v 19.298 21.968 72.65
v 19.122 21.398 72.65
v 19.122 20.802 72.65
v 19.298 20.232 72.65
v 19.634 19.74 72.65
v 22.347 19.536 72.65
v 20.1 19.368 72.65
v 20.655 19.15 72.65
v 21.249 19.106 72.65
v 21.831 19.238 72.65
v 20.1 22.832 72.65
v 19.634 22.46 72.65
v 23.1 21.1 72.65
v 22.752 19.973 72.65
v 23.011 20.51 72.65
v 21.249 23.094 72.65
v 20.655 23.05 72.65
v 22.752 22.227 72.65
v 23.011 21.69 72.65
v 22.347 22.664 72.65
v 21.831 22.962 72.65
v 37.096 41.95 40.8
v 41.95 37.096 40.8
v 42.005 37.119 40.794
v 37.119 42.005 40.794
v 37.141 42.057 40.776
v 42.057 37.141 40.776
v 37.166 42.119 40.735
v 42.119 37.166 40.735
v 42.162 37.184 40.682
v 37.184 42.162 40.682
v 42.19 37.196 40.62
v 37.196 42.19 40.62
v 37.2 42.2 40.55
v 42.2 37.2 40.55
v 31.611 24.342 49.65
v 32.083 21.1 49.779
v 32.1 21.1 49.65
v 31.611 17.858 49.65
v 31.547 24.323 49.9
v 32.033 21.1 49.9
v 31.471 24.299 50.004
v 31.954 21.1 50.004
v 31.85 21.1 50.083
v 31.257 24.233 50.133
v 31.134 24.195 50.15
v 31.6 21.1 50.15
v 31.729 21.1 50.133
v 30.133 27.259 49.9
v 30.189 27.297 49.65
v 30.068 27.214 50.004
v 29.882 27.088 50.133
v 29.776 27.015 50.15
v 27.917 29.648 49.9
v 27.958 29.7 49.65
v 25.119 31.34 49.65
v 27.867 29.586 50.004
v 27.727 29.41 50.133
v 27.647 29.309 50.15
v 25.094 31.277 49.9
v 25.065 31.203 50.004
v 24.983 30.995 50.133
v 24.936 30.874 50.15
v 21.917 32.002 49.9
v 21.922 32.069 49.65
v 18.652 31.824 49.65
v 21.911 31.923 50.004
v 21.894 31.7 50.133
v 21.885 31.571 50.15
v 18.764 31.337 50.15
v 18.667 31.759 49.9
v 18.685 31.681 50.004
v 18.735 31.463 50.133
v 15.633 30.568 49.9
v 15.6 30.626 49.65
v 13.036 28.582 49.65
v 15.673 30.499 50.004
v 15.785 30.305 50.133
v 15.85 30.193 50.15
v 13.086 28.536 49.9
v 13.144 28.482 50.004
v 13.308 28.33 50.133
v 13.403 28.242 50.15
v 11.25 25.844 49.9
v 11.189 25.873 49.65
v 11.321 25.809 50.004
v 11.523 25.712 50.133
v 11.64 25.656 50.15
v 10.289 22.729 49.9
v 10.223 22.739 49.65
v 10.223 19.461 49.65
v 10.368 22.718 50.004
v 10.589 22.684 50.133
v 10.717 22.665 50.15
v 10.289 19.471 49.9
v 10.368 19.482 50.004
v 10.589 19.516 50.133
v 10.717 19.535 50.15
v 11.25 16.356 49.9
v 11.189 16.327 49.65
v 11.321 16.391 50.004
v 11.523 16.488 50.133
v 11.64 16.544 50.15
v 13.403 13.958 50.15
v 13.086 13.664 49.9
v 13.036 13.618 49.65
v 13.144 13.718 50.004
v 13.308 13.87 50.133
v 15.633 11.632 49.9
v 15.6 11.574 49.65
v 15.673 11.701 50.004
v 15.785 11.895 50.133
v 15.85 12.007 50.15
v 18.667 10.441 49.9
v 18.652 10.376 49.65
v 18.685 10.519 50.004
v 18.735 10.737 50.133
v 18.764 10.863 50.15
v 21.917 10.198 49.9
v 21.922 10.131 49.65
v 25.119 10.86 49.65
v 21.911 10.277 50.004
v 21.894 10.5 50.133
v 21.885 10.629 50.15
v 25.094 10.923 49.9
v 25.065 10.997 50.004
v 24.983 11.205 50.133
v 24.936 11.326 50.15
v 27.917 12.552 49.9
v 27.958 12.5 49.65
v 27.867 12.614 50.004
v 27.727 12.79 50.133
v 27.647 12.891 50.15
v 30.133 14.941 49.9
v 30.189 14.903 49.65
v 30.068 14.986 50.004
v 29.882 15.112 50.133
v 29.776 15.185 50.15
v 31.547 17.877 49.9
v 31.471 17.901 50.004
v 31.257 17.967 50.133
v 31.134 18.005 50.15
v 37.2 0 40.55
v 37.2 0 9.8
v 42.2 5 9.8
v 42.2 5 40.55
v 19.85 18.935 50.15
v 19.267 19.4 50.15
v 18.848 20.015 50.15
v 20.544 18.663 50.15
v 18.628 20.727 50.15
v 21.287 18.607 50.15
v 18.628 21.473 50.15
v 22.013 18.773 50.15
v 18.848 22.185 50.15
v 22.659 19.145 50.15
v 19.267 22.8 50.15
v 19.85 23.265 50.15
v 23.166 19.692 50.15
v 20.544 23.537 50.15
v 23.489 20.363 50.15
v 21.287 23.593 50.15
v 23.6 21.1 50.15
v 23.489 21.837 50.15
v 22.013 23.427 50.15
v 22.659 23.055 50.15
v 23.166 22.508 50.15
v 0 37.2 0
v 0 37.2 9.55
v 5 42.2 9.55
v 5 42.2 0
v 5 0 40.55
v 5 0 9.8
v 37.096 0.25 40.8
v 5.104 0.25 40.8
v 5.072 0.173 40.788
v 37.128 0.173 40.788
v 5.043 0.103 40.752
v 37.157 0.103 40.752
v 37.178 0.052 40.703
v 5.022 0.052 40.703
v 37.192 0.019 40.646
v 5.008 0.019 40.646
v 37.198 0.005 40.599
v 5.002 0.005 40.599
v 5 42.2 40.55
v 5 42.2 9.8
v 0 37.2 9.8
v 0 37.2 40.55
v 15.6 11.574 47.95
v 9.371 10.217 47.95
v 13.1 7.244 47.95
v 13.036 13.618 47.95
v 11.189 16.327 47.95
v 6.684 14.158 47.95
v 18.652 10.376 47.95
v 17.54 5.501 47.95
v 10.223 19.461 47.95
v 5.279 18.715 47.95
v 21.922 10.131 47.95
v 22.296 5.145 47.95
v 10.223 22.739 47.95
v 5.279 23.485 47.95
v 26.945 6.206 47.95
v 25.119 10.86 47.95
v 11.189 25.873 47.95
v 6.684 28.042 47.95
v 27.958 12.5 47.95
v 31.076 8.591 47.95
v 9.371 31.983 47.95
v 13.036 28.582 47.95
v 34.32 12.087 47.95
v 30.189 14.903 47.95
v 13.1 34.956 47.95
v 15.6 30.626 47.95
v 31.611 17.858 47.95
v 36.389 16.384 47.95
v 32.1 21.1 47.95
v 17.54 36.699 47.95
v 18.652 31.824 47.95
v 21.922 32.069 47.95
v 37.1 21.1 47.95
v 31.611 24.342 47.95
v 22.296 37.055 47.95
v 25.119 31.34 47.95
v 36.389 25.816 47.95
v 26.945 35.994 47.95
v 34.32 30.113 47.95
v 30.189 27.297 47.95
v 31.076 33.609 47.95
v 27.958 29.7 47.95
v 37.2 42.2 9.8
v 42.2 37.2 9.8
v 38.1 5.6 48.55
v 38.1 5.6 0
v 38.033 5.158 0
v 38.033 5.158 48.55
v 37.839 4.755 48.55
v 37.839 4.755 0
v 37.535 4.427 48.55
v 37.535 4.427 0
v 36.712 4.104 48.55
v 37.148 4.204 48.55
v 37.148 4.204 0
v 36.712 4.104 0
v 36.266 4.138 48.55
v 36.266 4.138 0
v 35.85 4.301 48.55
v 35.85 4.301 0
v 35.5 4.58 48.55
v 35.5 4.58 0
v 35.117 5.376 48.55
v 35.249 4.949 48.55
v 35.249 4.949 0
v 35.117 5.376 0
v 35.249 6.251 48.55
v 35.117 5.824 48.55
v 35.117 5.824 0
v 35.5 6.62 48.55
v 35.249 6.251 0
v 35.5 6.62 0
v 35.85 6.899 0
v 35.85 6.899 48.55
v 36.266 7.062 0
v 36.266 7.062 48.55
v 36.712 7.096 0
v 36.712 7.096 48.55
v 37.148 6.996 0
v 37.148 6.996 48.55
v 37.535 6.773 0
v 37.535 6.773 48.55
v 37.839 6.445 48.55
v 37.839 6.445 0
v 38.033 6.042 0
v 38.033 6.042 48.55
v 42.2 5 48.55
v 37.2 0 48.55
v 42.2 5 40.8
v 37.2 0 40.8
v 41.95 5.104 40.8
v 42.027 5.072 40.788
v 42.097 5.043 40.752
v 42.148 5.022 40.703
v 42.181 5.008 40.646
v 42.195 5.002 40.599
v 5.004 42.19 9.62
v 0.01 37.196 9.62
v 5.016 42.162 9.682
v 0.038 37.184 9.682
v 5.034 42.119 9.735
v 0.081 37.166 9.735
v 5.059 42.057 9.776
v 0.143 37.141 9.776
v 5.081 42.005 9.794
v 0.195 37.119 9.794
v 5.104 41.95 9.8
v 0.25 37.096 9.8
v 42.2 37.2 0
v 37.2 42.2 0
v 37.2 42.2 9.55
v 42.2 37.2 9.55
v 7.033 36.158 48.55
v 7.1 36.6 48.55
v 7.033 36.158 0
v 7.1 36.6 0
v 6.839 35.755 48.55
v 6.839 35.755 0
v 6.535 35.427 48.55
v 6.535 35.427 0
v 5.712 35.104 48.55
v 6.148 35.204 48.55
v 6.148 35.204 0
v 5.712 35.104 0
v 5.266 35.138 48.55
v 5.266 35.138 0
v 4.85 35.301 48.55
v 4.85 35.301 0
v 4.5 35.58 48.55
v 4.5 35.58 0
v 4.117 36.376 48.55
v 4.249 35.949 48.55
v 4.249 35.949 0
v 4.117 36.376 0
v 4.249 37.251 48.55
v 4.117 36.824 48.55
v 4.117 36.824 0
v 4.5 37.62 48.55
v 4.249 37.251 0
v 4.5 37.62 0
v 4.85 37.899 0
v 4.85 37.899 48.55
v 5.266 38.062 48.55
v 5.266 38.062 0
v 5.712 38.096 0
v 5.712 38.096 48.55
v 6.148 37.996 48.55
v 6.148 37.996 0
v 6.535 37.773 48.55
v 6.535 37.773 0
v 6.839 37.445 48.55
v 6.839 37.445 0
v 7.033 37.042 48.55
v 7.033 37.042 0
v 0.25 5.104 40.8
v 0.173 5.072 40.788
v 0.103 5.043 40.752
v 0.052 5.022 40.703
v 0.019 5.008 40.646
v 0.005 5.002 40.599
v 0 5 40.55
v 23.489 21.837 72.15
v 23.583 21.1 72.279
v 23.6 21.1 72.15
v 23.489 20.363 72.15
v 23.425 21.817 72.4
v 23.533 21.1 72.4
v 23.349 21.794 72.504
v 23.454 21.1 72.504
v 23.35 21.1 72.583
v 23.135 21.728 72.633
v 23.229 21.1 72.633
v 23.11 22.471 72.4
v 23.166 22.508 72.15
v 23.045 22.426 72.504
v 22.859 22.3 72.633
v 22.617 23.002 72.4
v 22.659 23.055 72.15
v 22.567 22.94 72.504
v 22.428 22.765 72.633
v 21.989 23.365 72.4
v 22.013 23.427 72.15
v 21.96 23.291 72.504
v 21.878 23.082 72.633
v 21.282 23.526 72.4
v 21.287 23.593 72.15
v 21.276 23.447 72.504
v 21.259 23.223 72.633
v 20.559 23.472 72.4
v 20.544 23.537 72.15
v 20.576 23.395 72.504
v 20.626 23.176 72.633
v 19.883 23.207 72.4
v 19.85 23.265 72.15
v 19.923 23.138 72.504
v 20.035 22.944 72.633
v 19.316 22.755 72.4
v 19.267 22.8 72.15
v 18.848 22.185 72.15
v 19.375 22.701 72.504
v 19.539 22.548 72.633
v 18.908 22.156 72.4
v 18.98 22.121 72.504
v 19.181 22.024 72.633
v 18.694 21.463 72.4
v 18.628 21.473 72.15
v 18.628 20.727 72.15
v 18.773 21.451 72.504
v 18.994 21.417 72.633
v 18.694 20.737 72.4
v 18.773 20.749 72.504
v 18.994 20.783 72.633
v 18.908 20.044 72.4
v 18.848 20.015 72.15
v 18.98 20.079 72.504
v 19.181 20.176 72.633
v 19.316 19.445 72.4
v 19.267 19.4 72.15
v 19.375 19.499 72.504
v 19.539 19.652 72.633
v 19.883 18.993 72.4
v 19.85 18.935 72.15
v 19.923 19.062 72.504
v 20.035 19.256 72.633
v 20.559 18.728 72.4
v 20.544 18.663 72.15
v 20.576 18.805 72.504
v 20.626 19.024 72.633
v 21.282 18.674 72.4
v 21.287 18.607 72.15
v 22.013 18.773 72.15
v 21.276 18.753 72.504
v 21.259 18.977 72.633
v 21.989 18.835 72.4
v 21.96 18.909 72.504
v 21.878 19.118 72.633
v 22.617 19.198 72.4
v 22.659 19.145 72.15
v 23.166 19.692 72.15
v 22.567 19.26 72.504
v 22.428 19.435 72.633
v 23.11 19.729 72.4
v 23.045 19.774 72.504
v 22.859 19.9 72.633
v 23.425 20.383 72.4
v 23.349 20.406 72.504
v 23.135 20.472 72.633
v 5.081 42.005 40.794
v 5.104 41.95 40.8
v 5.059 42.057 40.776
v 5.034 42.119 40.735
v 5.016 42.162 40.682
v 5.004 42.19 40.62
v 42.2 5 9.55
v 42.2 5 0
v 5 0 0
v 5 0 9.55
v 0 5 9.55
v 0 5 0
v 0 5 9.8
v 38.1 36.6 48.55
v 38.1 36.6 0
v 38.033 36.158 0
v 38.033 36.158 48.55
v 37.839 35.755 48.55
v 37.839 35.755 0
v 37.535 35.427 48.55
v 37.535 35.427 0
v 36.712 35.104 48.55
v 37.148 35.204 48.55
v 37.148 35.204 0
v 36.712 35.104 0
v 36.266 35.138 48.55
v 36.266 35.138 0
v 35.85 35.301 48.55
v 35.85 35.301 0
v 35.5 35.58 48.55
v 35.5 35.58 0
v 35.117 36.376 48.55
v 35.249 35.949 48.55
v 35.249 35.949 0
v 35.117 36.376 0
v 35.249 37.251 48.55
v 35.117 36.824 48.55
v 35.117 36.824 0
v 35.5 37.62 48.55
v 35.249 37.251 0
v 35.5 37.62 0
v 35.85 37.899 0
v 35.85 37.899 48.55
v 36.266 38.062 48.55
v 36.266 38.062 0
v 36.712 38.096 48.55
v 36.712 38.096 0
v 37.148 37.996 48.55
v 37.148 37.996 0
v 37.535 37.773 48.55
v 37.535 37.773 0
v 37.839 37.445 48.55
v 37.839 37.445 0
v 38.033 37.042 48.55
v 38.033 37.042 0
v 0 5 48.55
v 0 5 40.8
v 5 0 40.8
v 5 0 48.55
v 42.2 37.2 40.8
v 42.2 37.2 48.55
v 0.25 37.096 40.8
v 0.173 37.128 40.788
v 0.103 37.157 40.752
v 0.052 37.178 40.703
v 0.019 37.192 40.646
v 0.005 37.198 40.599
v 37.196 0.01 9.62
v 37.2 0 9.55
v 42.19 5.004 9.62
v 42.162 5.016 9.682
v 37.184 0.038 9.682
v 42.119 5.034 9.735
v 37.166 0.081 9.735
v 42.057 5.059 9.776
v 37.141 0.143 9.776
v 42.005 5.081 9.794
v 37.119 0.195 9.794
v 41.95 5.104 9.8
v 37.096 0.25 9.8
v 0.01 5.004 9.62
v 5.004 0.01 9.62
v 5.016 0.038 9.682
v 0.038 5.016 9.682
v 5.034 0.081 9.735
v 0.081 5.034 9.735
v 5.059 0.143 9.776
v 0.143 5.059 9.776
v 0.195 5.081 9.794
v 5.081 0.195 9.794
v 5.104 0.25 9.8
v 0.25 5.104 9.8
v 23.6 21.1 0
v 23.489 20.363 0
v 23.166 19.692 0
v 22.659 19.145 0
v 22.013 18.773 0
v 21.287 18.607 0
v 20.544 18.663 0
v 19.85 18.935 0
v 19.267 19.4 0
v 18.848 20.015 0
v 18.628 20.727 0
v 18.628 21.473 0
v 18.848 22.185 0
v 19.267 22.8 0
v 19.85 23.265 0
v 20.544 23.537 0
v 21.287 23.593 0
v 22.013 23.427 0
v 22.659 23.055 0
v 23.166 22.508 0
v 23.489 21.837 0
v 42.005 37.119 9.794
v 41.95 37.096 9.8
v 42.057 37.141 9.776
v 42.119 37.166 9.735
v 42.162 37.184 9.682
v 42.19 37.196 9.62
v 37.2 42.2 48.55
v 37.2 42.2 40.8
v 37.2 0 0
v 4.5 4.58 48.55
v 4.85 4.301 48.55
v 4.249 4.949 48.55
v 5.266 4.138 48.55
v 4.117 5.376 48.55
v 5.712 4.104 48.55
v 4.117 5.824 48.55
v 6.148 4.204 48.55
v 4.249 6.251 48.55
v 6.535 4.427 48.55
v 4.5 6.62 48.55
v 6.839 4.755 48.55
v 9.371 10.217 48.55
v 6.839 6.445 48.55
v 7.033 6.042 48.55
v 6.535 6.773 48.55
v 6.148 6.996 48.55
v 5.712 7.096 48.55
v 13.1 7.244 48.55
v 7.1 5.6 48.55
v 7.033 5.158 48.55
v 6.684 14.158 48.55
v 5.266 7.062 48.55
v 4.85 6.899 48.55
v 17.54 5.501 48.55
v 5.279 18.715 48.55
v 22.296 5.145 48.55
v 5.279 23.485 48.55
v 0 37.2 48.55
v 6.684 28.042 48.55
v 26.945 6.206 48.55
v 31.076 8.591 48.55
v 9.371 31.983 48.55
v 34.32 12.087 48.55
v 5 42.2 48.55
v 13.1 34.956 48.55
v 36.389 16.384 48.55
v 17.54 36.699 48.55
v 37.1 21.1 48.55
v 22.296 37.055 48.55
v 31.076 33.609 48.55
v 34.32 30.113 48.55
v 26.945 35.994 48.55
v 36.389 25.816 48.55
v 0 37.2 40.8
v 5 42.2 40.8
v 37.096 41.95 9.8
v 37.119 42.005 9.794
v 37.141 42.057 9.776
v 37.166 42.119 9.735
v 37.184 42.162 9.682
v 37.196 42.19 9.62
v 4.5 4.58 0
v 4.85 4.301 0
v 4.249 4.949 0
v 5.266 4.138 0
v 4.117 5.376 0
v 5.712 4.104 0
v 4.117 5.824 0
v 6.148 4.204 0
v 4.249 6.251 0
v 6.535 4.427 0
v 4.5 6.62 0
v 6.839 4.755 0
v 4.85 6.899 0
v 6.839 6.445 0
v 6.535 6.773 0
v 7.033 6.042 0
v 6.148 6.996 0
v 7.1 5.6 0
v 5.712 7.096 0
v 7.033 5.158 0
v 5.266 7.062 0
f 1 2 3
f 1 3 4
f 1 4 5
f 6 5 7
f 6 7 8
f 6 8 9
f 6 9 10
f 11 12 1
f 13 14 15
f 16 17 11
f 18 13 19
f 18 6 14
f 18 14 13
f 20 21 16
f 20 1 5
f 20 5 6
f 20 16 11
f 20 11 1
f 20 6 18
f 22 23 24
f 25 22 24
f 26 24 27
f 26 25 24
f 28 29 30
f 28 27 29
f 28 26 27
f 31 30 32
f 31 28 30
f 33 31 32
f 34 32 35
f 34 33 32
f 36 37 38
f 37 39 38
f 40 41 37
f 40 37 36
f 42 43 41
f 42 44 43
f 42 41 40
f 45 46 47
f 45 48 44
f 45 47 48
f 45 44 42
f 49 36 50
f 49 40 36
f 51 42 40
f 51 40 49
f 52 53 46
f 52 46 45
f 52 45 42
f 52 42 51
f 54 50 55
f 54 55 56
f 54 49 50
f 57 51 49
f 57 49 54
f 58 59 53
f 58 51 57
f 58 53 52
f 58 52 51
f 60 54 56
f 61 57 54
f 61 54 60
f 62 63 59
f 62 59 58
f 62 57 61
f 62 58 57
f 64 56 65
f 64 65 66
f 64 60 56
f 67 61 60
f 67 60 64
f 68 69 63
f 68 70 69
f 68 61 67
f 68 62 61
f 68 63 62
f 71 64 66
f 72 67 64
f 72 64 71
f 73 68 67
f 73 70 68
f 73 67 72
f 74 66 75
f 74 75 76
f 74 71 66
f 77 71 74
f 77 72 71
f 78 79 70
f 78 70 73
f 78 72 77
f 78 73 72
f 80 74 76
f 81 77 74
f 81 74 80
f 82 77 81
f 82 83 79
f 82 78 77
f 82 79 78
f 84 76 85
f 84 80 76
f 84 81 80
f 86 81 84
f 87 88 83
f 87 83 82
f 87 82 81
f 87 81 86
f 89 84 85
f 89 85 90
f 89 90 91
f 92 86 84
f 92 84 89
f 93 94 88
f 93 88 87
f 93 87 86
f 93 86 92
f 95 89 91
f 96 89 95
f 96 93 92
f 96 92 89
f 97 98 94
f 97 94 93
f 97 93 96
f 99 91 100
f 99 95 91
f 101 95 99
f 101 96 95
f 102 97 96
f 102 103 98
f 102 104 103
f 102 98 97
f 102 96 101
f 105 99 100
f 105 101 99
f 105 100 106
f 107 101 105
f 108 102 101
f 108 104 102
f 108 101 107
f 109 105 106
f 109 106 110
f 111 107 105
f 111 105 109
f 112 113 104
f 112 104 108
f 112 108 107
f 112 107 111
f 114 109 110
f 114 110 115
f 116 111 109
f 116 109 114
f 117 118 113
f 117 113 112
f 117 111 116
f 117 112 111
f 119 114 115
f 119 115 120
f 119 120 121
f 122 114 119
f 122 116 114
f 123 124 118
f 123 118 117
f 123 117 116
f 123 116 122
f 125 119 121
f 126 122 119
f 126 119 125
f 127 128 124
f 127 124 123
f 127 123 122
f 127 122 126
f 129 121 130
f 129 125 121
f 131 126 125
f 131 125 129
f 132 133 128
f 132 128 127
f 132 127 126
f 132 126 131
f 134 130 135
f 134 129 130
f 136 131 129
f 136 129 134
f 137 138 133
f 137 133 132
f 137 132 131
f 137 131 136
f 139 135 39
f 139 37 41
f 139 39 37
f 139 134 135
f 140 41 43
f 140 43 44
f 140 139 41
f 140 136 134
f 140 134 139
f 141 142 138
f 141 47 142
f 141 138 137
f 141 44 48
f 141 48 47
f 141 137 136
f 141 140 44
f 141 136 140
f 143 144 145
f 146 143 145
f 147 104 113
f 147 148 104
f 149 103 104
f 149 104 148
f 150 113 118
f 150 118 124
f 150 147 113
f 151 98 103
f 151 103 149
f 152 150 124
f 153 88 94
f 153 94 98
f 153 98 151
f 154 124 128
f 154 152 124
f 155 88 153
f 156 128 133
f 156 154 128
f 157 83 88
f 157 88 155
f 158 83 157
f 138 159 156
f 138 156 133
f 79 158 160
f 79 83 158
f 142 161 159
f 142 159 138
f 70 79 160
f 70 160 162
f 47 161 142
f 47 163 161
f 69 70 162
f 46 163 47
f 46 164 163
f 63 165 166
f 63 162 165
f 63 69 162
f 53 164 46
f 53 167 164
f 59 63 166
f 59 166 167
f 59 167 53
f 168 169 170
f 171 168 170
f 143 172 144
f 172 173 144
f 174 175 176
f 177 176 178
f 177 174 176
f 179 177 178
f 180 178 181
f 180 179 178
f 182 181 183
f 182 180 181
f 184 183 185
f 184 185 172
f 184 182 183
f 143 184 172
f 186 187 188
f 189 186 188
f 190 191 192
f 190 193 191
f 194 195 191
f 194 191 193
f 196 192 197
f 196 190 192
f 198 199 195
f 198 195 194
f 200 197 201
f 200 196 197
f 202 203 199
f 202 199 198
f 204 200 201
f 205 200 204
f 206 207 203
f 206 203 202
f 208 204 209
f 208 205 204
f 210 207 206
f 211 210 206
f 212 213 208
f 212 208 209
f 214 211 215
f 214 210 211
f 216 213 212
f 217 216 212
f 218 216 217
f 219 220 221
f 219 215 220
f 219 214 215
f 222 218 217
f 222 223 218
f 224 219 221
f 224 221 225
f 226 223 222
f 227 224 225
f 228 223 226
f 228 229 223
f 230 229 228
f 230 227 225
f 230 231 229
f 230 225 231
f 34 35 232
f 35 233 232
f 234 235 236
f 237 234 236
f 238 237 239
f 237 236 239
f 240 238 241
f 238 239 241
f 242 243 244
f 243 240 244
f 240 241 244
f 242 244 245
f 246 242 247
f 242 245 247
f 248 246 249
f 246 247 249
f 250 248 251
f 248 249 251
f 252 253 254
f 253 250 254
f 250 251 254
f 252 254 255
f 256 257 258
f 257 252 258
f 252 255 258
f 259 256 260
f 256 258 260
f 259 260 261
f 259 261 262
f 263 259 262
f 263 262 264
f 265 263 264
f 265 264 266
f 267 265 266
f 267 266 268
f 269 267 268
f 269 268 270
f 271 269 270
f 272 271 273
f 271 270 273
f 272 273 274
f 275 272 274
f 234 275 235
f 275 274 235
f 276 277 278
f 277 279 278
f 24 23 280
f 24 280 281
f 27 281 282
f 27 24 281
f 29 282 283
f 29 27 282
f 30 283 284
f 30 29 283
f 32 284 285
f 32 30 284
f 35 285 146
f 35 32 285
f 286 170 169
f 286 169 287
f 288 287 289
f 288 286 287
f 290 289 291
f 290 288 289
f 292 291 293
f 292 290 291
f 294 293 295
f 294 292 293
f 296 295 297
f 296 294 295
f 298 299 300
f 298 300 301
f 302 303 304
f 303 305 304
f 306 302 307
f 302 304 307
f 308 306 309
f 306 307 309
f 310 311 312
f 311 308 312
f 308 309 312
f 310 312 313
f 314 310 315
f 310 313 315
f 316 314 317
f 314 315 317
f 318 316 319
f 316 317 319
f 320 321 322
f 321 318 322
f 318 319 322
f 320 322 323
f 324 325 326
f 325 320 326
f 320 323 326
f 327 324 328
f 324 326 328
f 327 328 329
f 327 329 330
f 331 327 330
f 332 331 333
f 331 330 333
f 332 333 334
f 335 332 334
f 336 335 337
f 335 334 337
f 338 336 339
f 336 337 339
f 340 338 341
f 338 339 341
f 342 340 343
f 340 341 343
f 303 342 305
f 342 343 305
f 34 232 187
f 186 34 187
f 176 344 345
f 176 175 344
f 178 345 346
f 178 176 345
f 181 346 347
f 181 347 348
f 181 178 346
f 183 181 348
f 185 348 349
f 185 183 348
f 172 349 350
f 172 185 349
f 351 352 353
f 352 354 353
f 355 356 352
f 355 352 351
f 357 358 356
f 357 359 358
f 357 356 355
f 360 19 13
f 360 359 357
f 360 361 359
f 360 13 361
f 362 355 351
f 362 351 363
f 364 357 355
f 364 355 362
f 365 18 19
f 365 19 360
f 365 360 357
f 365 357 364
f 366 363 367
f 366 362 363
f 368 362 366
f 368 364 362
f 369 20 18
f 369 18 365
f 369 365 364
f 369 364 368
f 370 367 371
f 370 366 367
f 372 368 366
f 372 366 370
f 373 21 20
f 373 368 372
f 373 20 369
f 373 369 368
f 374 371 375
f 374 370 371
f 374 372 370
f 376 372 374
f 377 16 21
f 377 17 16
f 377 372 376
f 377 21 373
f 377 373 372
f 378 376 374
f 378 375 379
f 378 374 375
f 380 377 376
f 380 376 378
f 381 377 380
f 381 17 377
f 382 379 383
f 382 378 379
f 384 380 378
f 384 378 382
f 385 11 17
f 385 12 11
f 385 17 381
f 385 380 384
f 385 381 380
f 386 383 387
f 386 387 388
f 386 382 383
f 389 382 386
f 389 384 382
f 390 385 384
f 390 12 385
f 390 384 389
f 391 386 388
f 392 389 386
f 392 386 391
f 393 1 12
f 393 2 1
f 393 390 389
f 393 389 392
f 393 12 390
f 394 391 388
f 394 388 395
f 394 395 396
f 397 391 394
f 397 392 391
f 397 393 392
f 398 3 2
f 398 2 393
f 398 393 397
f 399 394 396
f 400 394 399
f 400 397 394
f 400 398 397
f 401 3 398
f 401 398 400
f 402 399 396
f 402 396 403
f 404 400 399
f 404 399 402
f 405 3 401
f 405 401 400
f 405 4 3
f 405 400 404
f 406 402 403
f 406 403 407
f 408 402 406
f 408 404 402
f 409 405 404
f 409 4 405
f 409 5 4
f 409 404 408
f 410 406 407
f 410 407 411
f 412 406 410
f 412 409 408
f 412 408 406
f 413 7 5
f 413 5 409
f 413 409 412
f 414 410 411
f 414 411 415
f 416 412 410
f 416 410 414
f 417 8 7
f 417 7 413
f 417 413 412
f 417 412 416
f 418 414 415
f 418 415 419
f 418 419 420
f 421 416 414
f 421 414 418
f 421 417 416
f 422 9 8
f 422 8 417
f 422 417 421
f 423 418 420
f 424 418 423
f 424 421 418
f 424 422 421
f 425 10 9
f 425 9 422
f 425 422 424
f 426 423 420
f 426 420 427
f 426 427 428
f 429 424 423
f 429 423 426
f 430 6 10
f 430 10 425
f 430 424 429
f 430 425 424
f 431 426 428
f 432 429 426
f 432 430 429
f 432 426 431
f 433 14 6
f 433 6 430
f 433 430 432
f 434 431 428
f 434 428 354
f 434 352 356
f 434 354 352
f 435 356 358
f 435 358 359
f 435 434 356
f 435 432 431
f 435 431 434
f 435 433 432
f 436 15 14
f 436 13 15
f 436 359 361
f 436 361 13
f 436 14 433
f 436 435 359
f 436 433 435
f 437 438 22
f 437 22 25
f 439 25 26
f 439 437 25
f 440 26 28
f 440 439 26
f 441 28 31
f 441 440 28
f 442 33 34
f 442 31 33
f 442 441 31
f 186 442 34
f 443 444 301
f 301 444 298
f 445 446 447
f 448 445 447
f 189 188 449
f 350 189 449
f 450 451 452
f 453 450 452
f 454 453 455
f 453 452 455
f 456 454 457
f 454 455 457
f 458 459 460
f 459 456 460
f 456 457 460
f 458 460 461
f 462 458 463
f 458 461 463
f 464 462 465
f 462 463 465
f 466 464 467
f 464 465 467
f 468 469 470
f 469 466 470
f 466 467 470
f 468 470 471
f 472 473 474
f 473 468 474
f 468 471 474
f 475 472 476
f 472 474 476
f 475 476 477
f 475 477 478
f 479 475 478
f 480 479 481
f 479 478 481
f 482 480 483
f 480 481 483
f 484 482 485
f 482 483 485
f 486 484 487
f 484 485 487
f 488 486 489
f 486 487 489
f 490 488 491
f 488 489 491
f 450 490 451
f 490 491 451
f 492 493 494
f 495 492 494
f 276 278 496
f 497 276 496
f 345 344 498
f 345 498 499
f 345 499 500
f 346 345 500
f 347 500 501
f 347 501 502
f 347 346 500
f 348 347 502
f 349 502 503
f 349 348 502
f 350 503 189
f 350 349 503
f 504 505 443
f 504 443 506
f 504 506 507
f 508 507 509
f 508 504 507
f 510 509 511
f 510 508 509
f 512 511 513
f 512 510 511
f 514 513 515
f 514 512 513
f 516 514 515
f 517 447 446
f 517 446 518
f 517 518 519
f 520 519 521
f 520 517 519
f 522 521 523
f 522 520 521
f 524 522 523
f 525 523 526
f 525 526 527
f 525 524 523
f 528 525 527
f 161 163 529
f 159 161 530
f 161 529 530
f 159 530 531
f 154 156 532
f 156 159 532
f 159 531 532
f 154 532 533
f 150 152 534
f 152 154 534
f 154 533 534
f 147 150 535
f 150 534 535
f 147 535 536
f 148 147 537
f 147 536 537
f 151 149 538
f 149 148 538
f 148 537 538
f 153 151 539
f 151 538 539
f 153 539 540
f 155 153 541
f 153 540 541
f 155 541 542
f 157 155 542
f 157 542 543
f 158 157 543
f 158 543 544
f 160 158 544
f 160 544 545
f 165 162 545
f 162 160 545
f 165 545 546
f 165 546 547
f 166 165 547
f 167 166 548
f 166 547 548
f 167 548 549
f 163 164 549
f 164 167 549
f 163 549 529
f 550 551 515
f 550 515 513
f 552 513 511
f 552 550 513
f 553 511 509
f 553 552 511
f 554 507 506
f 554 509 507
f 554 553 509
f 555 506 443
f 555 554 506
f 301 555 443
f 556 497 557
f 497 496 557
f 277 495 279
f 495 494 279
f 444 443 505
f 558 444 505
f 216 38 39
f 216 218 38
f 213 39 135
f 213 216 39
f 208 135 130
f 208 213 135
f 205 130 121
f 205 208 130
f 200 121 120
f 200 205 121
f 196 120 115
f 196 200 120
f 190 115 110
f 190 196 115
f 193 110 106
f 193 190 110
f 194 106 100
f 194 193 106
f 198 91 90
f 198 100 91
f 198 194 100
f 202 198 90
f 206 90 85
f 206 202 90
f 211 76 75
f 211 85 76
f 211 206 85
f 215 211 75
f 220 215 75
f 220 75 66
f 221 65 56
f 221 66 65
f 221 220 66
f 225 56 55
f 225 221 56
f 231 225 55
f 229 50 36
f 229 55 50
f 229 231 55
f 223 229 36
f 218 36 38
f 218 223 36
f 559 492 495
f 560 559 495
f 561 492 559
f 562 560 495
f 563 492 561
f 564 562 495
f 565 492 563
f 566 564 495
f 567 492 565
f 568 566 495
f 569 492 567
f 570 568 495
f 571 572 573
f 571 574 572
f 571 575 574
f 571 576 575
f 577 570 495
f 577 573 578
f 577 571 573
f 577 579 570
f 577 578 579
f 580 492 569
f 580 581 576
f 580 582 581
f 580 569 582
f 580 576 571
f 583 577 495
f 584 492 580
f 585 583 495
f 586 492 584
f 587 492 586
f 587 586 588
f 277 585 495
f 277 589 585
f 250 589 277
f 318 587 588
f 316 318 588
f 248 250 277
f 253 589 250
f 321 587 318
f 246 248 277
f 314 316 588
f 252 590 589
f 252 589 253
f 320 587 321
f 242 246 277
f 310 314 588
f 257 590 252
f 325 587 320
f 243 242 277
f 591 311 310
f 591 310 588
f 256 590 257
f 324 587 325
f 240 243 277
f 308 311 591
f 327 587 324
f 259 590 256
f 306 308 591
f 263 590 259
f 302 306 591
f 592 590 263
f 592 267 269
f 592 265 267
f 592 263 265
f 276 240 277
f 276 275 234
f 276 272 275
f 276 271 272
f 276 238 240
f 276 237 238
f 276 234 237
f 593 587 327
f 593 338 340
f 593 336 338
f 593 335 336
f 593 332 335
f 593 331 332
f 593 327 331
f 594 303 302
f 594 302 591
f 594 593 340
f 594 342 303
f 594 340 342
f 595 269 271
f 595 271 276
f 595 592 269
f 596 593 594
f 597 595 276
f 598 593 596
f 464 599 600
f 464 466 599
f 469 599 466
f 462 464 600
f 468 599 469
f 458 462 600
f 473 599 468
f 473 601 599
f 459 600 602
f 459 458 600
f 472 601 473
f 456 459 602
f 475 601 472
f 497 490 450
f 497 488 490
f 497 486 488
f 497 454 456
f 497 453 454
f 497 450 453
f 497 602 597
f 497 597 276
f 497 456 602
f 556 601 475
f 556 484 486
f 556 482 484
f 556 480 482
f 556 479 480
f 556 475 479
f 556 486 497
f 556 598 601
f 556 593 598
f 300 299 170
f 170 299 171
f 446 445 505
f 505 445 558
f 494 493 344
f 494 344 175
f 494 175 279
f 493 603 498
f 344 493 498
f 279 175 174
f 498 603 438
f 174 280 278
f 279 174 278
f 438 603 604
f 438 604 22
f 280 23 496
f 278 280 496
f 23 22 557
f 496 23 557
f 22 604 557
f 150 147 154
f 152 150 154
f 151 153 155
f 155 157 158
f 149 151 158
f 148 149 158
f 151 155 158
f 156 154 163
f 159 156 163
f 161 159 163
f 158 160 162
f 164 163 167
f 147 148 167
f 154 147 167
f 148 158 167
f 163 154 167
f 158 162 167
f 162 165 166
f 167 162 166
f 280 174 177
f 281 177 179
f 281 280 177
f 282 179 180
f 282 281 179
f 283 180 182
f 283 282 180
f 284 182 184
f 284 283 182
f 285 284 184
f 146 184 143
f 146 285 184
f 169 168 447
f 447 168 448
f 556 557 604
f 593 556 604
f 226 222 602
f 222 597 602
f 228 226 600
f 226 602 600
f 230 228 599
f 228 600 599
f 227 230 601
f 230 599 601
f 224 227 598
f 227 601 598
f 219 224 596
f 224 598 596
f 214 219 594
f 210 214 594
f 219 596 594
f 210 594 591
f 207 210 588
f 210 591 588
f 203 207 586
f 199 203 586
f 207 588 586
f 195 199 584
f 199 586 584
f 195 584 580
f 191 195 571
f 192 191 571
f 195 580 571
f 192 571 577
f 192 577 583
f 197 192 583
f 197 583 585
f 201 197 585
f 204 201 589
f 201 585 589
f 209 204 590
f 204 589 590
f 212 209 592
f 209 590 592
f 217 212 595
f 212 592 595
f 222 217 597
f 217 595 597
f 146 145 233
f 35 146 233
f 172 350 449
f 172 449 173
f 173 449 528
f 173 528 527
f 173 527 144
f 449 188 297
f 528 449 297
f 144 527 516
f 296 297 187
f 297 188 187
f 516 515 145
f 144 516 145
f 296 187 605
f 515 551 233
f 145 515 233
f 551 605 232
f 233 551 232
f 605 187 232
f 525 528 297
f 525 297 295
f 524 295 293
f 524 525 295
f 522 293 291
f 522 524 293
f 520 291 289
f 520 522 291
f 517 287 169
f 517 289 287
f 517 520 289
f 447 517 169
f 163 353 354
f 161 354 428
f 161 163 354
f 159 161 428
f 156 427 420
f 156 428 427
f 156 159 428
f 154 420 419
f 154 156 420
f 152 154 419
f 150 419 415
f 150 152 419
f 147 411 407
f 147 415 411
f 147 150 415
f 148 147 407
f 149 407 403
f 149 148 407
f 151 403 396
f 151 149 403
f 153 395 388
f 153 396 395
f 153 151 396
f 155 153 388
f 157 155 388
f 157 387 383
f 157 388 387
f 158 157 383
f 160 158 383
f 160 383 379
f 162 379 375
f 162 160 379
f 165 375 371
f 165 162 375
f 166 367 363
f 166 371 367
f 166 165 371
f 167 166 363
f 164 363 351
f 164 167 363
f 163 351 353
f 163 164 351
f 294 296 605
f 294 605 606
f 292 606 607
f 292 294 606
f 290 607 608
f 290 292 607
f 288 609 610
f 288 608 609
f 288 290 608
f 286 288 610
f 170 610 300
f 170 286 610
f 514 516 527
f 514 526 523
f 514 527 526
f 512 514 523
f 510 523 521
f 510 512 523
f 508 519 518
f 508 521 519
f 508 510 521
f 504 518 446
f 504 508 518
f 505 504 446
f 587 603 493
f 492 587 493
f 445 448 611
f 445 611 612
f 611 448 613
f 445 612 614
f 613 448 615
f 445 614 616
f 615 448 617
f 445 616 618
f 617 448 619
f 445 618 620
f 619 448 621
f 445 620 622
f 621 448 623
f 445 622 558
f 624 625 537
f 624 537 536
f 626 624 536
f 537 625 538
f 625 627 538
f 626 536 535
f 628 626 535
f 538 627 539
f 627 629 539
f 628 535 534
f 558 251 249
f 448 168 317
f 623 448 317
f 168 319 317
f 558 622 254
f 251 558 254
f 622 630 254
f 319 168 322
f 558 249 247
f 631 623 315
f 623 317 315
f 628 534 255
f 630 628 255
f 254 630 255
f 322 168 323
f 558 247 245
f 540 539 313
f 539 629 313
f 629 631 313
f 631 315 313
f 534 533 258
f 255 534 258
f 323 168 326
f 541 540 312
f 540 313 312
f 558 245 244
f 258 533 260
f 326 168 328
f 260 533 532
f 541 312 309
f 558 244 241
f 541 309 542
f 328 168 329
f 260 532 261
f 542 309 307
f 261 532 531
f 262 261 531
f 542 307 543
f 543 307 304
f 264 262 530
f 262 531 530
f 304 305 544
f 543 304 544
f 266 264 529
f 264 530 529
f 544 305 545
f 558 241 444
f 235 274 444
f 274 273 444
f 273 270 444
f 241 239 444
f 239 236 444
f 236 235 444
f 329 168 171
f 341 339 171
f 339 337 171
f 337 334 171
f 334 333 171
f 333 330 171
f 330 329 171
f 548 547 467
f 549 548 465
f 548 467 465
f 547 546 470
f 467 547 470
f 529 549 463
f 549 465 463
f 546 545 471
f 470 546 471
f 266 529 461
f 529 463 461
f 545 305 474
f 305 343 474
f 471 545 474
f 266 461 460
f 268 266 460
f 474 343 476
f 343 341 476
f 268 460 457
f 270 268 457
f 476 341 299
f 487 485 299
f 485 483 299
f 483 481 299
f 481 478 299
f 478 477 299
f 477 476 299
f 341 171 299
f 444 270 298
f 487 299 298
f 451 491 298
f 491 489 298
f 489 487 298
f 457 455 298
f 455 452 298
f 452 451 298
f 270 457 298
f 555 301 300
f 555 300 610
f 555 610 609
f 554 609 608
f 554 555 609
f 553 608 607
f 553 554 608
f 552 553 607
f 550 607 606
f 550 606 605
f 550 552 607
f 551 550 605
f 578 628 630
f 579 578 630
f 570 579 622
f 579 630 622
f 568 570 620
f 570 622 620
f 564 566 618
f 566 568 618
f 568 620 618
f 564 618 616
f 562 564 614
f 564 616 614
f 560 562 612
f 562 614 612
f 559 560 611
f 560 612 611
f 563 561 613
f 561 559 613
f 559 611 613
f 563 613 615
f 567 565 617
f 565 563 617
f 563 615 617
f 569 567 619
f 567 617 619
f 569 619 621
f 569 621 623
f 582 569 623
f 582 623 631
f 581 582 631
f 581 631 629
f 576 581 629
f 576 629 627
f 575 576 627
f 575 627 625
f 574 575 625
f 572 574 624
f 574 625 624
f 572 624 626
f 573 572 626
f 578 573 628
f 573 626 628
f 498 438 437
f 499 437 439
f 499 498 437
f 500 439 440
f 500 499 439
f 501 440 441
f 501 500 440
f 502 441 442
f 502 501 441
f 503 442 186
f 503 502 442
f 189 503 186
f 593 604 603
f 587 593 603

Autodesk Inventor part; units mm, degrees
ref_plane "YZ Plane" through (0, 0, 0) normal (1, 0, 0) x (0, 1, 0)
ref_plane "XZ Plane" through (0, 0, 0) normal (0, 1, 0) x (-1, 0, 0)
ref_plane "XY Plane" through (0, 0, 0) normal (0, 0, 1) x (1, 0, 0)
sketch "Sketch1" plane through (0, 0, 0) normal (0, 0, 1) x (1, 0, 0)
  line L0 (0, 37.2) -> (5, 42.2)
  line L1 (37.2, 42.2) -> (42.2, 37.2)
  line L2 (42.2, 5) -> (37.2, 0)
  line L3 (5, 0) -> (0, 5)
  line L4 (0, 37.2) -> (0, 5)
  line L5 (37.2, 42.2) -> (5, 42.2)
  line L6 (42.2, 5) -> (42.2, 37.2)
  line L7 (5, 0) -> (37.2, 0)
  line L8 (0, 5) -> (0, 0)
  circle A0 centre (21.1, 21.1) radius 2.5
  circle A1 centre (5.6, 36.6) radius 1.5
  circle A2 centre (36.6, 36.6) radius 1.5
  circle A3 centre (36.6, 5.6) radius 1.5
  circle A4 centre (5.6, 5.6) radius 1.5
  dimension "d8" = 5
  dimension "d9" = 5
  dimension "d10" = 5
  dimension "d11" = 21.1
  dimension "d12" = 21.1
  dimension "d13" = 3
  dimension "d14" = 3
  dimension "d15" = 3
  dimension "d16" = 3
  dimension "d17" = 31
  dimension "d18" = 31
  dimension "d19" = 31
  dimension "d20" = 31
  dimension "d21" = 5.6
  dimension "d22" = 5.6
  dimension "d43" = 5.6
  dimension "d44" = 5.6
  dimension "d45" = 5.6
  dimension "d46" = 5.6
  dimension "d47" = 42.2
extrude "Extrusion1" add sketch "Sketch1" along normal blind 9.8
sketch "Sketch2" plane through (0, 0, 9.8) normal (0, 0, 1) x (1, 0, 0)
  circle A0 centre (21.1, 21.1) radius 2.5 projected
  circle A1 centre (5.6, 5.6) radius 1.5 projected
  circle A2 centre (36.6, 5.6) radius 1.5 projected
  circle A3 centre (36.6, 36.6) radius 1.5 projected
  circle A4 centre (5.6, 36.6) radius 1.5 projected
  line L0 (5, 42.2) -> (0, 37.2) projected
  line L1 (0, 37.2) -> (0, 5) projected
  line L2 (0, 5) -> (5, 0) projected
  line L3 (5, 0) -> (37.2, 0) projected
  line L4 (37.2, 0) -> (42.2, 5) projected
  line L5 (42.2, 5) -> (42.2, 37.2) projected
  line L6 (42.2, 37.2) -> (37.2, 42.2) projected
  line L7 (37.2, 42.2) -> (5, 42.2) projected
  point P0 (0, 0)
fillet "Fillet1" radius 0.25 8 edges at (21.1, 42.2, 9.8) (39.7, 39.7, 9.8) (42.2, 21.1, 9.8) (39.7, 2.5, 9.8) (21.1, 0, 9.8) (2.5, 2.5, 9.8) (0, 21.1, 9.8) (2.5, 39.7, 9.8)
extrude "Extrusion2" add sketch "Sketch2" along normal blind 31
sketch "Sketch3" plane through (0, 0, 40.8) normal (0, 0, 1) x (1, 0, 0)
  circle A0 centre (21.1, 21.1) radius 2.5 projected
  circle A1 centre (5.6, 36.6) radius 1.5 projected
  circle A2 centre (36.6, 36.6) radius 1.5 projected
  circle A3 centre (36.6, 5.6) radius 1.5 projected
  circle A4 centre (5.6, 5.6) radius 1.5 projected
  line L0 (5, 42.2) -> (0, 37.2) projected
  line L1 (0, 37.2) -> (0, 5) projected
  line L2 (0, 5) -> (5, 0) projected
  line L3 (5, 0) -> (37.2, 0) projected
  line L4 (37.2, 0) -> (42.2, 5) projected
  line L5 (42.2, 5) -> (42.2, 37.2) projected
  line L6 (42.2, 37.2) -> (37.2, 42.2) projected
  line L7 (37.2, 42.2) -> (5, 42.2) projected
  point P0 (0, 0)
fillet "Fillet2" radius 0.25 8 edges at (21.1, 42.2, 40.8) (39.7, 39.7, 40.8) (42.2, 21.1, 40.8) (39.7, 2.5, 40.8) (21.1, 0, 40.8) (2.5, 2.5, 40.8) (0, 21.1, 40.8) (2.5, 39.7, 40.8)
extrude "Extrusion3" add sketch "Sketch3" along normal blind 7.75
sketch "Sketch4" plane through (0, 0, 48.55) normal (0, 0, 1) x (1, 0, 0)
  circle A0 centre (21.1, 21.1) radius 2.5 projected
  circle A1 centre (21.1, 21.1) radius 16
  point P0 (0, 0)
  dimension "d31" = 32
extrude "Extrusion4" cut sketch "Sketch4" against normal blind 0.6
sketch "Sketch5" plane through (21.1, 21.1, 47.95) normal (0, 0, 1) x (1, 0, 0)
  circle A0 centre (0, 0) radius 2.5 projected
  circle A1 centre (0, 0) radius 16 projected
  circle A2 centre (0, 0) radius 11
  point P0 (-21.1, -21.1)
  dimension "d35" = 22
extrude "Extrusion5" add sketch "Sketch5" along normal blind 2.2 contours A2
fillet "Fillet3" radius 0.5 1 edges at (10.1, 21.1, 50.15)
sketch "Sketch6" plane through (21.1, 21.1, 50.15) normal (0, 0, 1) x (1, 0, 0)
  circle A0 centre (0, 0) radius 2.5 projected
  point P0 (-21.1, -21.1)
extrude "Extrusion6" add sketch "Sketch6" along normal blind 22.5
fillet "Fillet4" radius 0.5 1 edges at (18.6, 21.1, 72.65)
properties part number "Nema 17 stepper motor"
